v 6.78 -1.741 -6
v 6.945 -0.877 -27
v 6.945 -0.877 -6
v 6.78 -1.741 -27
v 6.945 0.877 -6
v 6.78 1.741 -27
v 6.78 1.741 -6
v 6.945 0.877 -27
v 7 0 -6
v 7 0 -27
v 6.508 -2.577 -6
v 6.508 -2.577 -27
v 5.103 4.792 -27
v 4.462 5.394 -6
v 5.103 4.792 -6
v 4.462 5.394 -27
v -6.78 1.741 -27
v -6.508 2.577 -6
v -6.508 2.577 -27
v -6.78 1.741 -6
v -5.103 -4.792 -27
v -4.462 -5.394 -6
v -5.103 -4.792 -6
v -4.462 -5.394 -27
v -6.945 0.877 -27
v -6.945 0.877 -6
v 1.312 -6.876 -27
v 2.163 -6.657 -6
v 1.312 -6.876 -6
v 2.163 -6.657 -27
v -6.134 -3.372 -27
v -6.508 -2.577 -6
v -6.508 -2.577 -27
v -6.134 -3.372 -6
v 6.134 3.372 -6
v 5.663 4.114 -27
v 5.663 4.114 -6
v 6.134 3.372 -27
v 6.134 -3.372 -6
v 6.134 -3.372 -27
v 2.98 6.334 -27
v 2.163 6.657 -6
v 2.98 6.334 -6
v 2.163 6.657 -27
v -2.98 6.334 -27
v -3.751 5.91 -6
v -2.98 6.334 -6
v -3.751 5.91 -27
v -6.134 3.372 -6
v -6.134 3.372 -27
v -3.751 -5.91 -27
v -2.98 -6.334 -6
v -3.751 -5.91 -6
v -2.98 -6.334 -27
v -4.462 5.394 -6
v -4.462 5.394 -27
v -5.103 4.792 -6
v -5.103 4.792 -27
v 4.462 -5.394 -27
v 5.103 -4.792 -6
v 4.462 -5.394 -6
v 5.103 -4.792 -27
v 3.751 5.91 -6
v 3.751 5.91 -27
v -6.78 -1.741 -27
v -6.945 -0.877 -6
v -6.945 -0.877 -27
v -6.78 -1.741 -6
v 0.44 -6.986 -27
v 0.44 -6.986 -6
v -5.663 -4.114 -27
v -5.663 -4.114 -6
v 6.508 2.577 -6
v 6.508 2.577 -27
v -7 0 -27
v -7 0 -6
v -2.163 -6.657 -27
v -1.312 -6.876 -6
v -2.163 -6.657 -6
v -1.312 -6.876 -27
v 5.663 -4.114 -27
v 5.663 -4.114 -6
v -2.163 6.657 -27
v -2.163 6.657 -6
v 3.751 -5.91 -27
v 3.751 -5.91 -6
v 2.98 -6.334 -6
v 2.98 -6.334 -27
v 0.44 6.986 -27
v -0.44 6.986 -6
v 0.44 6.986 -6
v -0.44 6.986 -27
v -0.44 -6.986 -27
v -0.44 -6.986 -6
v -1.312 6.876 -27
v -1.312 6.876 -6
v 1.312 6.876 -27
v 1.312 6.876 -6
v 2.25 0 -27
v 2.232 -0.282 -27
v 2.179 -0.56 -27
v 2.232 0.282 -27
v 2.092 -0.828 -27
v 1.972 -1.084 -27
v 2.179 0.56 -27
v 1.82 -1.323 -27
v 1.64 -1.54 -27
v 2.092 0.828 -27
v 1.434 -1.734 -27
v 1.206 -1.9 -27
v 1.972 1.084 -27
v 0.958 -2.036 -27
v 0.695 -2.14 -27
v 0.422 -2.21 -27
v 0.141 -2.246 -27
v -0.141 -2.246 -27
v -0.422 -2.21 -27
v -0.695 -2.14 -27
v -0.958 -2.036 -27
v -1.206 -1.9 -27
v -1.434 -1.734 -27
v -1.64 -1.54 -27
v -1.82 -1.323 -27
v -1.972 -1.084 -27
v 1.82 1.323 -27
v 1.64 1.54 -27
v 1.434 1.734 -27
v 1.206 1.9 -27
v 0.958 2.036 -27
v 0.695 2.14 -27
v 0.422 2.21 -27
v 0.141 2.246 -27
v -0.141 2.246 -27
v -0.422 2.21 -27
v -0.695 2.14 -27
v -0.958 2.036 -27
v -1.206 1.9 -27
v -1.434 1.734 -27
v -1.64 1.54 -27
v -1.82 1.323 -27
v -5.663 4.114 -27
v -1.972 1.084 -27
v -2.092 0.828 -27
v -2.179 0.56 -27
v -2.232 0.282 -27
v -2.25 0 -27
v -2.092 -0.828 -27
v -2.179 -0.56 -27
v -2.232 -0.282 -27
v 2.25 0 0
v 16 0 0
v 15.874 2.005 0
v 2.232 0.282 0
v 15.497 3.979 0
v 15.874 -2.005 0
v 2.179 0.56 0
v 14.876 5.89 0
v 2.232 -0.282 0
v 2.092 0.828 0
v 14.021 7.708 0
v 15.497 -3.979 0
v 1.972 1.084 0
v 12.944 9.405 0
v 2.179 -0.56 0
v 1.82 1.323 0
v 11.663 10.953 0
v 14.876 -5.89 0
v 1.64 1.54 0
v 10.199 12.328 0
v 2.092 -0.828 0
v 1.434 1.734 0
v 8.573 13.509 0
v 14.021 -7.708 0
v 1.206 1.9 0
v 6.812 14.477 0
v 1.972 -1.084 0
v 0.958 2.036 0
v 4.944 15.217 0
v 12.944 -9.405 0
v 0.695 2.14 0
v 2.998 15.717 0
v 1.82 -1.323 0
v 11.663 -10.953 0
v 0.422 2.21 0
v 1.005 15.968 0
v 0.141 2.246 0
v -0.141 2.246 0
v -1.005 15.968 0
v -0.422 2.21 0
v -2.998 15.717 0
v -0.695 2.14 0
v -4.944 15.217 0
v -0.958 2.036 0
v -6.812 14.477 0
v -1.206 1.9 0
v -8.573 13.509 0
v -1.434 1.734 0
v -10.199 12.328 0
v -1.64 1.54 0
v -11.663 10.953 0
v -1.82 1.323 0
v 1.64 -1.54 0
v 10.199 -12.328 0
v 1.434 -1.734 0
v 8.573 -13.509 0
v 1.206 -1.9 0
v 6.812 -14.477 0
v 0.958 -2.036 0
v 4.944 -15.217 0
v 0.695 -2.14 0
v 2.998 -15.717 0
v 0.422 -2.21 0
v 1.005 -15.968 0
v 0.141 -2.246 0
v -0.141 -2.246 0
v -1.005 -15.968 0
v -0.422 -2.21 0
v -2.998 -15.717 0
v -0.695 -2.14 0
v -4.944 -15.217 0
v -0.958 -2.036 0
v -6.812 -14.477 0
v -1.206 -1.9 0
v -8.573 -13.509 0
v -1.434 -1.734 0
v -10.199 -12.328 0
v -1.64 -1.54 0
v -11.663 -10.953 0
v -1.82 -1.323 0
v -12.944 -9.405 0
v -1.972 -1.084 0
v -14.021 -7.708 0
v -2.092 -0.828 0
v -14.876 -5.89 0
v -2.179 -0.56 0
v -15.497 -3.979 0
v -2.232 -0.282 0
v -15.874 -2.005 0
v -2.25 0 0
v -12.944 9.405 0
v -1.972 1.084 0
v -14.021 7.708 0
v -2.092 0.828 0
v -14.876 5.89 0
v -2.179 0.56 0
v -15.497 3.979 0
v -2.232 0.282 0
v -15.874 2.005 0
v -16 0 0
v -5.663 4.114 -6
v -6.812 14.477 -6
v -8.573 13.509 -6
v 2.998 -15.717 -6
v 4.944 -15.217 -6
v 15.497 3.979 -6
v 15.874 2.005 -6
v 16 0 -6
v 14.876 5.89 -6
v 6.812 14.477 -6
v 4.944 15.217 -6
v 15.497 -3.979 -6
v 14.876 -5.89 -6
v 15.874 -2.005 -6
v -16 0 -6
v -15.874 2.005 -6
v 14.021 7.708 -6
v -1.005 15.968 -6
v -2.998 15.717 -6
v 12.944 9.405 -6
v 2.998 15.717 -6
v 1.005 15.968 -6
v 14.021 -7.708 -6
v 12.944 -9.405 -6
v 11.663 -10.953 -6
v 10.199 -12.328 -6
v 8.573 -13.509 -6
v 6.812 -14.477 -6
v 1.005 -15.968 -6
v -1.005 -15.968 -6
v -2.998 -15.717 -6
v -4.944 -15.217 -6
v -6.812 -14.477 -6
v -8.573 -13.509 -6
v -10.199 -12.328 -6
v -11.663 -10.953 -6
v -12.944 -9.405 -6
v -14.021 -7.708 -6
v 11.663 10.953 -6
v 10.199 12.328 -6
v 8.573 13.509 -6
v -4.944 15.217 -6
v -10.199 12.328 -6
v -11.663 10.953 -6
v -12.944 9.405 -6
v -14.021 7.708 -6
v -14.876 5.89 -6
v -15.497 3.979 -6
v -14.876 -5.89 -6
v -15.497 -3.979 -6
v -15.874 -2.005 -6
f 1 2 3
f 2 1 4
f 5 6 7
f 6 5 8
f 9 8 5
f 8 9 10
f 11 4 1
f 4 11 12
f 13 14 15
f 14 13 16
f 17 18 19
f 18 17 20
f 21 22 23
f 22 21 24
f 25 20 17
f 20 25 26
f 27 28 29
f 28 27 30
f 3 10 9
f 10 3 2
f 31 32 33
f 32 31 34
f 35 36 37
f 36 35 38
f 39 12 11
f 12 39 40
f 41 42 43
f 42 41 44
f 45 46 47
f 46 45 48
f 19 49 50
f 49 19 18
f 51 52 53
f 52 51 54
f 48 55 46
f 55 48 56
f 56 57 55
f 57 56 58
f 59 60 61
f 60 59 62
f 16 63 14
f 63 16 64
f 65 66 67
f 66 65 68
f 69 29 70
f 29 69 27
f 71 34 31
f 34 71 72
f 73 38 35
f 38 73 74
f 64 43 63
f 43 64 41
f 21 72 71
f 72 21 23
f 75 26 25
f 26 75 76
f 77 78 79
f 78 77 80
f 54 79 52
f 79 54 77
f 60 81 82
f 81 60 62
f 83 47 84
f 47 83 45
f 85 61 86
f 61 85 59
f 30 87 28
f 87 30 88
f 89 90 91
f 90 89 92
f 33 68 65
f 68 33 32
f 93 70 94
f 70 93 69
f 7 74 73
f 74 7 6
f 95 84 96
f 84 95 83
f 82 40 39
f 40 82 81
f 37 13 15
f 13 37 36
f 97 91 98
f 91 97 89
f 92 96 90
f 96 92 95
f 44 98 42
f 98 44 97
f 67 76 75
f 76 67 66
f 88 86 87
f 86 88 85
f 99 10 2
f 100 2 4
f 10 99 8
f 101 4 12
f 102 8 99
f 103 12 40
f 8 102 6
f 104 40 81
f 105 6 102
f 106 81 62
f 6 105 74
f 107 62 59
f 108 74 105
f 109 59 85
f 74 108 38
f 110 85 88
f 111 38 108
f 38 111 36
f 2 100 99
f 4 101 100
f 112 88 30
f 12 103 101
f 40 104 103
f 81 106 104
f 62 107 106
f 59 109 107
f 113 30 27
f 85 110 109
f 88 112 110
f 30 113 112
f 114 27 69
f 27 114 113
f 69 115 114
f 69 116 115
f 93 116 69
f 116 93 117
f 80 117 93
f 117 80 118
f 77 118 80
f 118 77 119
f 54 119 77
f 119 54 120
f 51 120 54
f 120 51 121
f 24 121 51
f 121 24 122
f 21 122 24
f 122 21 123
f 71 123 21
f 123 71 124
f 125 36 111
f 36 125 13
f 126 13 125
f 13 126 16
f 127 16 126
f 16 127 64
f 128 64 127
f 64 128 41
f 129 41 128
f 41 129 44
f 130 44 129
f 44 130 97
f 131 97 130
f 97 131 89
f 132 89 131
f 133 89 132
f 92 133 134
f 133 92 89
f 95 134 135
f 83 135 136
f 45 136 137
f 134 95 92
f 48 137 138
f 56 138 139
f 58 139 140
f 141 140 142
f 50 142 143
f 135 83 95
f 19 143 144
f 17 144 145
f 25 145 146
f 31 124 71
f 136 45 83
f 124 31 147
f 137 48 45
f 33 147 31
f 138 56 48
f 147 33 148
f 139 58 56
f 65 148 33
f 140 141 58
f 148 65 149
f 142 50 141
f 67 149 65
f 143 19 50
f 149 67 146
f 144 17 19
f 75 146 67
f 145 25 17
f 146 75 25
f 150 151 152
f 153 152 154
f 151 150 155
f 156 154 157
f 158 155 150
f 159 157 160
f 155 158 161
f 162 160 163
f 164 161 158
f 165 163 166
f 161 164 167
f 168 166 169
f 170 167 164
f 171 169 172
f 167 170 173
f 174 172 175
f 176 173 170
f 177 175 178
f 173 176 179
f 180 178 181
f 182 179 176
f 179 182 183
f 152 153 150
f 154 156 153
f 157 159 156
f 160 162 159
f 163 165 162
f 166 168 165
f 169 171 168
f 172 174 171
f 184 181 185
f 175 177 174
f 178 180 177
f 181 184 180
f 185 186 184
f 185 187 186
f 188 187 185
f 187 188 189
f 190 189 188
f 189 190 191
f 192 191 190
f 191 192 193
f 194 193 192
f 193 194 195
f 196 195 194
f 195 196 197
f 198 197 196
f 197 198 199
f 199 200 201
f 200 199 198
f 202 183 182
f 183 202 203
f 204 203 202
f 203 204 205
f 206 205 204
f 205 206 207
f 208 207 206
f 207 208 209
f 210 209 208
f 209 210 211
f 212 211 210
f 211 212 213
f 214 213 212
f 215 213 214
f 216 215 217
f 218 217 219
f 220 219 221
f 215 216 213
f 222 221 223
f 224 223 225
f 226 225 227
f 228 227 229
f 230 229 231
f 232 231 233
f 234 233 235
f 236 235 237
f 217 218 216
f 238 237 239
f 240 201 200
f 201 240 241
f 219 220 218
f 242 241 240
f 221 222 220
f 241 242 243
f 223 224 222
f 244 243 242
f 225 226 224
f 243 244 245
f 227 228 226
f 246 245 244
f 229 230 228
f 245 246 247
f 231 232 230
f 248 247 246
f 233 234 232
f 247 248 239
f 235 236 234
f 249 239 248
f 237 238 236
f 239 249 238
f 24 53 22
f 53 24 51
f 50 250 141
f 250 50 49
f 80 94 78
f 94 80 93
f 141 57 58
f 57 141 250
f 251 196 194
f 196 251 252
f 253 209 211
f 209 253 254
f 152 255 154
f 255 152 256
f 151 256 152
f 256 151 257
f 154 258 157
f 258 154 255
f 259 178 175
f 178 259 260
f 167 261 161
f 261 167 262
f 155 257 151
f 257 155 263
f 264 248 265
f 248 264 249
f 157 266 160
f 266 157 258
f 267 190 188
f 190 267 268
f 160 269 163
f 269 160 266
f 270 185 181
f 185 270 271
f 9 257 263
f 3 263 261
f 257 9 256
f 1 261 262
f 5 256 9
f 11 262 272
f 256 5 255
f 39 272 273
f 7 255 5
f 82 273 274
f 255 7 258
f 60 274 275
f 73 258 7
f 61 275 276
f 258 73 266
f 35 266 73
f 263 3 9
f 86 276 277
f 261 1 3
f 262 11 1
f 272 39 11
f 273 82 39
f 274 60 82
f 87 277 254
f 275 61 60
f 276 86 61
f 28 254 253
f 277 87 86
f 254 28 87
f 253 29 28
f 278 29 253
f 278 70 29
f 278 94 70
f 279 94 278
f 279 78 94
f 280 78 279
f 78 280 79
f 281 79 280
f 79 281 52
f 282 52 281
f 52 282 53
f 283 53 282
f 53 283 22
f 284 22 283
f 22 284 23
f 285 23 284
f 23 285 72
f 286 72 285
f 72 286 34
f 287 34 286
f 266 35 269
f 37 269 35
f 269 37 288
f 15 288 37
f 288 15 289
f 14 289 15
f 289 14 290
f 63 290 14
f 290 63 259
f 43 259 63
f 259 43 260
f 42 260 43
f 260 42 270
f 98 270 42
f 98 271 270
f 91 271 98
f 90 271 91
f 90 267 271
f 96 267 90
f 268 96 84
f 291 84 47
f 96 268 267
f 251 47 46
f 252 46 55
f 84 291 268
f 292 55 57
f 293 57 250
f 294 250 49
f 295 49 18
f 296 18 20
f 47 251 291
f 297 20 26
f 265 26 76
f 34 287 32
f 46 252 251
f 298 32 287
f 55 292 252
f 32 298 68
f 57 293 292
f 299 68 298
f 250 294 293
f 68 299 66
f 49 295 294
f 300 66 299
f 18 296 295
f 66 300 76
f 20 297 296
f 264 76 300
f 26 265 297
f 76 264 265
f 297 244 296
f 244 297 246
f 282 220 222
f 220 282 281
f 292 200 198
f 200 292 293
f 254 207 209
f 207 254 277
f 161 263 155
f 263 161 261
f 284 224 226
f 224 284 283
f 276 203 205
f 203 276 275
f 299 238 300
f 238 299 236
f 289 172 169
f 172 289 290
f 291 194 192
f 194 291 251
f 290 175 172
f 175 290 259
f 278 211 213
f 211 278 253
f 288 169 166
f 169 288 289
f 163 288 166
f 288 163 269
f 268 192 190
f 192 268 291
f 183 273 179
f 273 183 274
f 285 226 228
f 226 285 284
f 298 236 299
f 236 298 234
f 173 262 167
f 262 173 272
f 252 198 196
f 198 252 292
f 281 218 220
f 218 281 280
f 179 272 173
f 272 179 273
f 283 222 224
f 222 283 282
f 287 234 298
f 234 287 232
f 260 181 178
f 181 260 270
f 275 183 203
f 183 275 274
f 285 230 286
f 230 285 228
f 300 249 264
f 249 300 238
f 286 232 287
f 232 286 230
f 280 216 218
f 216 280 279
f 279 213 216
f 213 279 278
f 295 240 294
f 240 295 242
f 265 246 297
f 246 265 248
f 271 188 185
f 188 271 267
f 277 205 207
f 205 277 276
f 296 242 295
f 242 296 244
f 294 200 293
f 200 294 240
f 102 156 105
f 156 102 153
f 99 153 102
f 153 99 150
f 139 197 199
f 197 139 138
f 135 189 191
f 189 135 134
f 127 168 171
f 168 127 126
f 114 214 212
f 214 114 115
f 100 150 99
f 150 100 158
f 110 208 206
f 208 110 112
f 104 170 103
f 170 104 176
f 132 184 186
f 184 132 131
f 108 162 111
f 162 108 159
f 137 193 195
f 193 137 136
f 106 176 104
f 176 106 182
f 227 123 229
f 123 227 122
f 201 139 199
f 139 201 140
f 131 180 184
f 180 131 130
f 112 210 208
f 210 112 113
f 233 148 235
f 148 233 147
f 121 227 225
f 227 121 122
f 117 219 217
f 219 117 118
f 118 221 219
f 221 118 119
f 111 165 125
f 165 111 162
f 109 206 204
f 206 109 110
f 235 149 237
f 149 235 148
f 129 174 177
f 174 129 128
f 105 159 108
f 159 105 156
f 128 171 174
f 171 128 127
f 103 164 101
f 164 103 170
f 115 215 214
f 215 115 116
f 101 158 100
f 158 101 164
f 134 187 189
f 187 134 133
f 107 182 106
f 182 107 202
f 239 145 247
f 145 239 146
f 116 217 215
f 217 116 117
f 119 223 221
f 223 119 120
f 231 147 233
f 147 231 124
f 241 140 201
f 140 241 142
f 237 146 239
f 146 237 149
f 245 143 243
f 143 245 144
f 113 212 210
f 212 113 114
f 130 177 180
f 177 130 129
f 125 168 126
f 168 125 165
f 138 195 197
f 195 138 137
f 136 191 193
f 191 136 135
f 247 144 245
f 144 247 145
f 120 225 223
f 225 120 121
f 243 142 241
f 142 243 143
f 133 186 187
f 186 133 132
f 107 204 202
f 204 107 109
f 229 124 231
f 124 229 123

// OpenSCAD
$fn = 50;


difference() {
	union() {
		translate(v = [0, 0, -27.0000000000]) {
			cylinder(h = 27, r = 7.0000000000);
		}
		translate(v = [0, 0, -6.0000000000]) {
			cylinder(h = 6, r = 16.0000000000);
		}
	}
	union() {
		#translate(v = [0, 0, -27]) {
			cylinder(h = 27, r = 2.2500000000);
		}
	}
}
